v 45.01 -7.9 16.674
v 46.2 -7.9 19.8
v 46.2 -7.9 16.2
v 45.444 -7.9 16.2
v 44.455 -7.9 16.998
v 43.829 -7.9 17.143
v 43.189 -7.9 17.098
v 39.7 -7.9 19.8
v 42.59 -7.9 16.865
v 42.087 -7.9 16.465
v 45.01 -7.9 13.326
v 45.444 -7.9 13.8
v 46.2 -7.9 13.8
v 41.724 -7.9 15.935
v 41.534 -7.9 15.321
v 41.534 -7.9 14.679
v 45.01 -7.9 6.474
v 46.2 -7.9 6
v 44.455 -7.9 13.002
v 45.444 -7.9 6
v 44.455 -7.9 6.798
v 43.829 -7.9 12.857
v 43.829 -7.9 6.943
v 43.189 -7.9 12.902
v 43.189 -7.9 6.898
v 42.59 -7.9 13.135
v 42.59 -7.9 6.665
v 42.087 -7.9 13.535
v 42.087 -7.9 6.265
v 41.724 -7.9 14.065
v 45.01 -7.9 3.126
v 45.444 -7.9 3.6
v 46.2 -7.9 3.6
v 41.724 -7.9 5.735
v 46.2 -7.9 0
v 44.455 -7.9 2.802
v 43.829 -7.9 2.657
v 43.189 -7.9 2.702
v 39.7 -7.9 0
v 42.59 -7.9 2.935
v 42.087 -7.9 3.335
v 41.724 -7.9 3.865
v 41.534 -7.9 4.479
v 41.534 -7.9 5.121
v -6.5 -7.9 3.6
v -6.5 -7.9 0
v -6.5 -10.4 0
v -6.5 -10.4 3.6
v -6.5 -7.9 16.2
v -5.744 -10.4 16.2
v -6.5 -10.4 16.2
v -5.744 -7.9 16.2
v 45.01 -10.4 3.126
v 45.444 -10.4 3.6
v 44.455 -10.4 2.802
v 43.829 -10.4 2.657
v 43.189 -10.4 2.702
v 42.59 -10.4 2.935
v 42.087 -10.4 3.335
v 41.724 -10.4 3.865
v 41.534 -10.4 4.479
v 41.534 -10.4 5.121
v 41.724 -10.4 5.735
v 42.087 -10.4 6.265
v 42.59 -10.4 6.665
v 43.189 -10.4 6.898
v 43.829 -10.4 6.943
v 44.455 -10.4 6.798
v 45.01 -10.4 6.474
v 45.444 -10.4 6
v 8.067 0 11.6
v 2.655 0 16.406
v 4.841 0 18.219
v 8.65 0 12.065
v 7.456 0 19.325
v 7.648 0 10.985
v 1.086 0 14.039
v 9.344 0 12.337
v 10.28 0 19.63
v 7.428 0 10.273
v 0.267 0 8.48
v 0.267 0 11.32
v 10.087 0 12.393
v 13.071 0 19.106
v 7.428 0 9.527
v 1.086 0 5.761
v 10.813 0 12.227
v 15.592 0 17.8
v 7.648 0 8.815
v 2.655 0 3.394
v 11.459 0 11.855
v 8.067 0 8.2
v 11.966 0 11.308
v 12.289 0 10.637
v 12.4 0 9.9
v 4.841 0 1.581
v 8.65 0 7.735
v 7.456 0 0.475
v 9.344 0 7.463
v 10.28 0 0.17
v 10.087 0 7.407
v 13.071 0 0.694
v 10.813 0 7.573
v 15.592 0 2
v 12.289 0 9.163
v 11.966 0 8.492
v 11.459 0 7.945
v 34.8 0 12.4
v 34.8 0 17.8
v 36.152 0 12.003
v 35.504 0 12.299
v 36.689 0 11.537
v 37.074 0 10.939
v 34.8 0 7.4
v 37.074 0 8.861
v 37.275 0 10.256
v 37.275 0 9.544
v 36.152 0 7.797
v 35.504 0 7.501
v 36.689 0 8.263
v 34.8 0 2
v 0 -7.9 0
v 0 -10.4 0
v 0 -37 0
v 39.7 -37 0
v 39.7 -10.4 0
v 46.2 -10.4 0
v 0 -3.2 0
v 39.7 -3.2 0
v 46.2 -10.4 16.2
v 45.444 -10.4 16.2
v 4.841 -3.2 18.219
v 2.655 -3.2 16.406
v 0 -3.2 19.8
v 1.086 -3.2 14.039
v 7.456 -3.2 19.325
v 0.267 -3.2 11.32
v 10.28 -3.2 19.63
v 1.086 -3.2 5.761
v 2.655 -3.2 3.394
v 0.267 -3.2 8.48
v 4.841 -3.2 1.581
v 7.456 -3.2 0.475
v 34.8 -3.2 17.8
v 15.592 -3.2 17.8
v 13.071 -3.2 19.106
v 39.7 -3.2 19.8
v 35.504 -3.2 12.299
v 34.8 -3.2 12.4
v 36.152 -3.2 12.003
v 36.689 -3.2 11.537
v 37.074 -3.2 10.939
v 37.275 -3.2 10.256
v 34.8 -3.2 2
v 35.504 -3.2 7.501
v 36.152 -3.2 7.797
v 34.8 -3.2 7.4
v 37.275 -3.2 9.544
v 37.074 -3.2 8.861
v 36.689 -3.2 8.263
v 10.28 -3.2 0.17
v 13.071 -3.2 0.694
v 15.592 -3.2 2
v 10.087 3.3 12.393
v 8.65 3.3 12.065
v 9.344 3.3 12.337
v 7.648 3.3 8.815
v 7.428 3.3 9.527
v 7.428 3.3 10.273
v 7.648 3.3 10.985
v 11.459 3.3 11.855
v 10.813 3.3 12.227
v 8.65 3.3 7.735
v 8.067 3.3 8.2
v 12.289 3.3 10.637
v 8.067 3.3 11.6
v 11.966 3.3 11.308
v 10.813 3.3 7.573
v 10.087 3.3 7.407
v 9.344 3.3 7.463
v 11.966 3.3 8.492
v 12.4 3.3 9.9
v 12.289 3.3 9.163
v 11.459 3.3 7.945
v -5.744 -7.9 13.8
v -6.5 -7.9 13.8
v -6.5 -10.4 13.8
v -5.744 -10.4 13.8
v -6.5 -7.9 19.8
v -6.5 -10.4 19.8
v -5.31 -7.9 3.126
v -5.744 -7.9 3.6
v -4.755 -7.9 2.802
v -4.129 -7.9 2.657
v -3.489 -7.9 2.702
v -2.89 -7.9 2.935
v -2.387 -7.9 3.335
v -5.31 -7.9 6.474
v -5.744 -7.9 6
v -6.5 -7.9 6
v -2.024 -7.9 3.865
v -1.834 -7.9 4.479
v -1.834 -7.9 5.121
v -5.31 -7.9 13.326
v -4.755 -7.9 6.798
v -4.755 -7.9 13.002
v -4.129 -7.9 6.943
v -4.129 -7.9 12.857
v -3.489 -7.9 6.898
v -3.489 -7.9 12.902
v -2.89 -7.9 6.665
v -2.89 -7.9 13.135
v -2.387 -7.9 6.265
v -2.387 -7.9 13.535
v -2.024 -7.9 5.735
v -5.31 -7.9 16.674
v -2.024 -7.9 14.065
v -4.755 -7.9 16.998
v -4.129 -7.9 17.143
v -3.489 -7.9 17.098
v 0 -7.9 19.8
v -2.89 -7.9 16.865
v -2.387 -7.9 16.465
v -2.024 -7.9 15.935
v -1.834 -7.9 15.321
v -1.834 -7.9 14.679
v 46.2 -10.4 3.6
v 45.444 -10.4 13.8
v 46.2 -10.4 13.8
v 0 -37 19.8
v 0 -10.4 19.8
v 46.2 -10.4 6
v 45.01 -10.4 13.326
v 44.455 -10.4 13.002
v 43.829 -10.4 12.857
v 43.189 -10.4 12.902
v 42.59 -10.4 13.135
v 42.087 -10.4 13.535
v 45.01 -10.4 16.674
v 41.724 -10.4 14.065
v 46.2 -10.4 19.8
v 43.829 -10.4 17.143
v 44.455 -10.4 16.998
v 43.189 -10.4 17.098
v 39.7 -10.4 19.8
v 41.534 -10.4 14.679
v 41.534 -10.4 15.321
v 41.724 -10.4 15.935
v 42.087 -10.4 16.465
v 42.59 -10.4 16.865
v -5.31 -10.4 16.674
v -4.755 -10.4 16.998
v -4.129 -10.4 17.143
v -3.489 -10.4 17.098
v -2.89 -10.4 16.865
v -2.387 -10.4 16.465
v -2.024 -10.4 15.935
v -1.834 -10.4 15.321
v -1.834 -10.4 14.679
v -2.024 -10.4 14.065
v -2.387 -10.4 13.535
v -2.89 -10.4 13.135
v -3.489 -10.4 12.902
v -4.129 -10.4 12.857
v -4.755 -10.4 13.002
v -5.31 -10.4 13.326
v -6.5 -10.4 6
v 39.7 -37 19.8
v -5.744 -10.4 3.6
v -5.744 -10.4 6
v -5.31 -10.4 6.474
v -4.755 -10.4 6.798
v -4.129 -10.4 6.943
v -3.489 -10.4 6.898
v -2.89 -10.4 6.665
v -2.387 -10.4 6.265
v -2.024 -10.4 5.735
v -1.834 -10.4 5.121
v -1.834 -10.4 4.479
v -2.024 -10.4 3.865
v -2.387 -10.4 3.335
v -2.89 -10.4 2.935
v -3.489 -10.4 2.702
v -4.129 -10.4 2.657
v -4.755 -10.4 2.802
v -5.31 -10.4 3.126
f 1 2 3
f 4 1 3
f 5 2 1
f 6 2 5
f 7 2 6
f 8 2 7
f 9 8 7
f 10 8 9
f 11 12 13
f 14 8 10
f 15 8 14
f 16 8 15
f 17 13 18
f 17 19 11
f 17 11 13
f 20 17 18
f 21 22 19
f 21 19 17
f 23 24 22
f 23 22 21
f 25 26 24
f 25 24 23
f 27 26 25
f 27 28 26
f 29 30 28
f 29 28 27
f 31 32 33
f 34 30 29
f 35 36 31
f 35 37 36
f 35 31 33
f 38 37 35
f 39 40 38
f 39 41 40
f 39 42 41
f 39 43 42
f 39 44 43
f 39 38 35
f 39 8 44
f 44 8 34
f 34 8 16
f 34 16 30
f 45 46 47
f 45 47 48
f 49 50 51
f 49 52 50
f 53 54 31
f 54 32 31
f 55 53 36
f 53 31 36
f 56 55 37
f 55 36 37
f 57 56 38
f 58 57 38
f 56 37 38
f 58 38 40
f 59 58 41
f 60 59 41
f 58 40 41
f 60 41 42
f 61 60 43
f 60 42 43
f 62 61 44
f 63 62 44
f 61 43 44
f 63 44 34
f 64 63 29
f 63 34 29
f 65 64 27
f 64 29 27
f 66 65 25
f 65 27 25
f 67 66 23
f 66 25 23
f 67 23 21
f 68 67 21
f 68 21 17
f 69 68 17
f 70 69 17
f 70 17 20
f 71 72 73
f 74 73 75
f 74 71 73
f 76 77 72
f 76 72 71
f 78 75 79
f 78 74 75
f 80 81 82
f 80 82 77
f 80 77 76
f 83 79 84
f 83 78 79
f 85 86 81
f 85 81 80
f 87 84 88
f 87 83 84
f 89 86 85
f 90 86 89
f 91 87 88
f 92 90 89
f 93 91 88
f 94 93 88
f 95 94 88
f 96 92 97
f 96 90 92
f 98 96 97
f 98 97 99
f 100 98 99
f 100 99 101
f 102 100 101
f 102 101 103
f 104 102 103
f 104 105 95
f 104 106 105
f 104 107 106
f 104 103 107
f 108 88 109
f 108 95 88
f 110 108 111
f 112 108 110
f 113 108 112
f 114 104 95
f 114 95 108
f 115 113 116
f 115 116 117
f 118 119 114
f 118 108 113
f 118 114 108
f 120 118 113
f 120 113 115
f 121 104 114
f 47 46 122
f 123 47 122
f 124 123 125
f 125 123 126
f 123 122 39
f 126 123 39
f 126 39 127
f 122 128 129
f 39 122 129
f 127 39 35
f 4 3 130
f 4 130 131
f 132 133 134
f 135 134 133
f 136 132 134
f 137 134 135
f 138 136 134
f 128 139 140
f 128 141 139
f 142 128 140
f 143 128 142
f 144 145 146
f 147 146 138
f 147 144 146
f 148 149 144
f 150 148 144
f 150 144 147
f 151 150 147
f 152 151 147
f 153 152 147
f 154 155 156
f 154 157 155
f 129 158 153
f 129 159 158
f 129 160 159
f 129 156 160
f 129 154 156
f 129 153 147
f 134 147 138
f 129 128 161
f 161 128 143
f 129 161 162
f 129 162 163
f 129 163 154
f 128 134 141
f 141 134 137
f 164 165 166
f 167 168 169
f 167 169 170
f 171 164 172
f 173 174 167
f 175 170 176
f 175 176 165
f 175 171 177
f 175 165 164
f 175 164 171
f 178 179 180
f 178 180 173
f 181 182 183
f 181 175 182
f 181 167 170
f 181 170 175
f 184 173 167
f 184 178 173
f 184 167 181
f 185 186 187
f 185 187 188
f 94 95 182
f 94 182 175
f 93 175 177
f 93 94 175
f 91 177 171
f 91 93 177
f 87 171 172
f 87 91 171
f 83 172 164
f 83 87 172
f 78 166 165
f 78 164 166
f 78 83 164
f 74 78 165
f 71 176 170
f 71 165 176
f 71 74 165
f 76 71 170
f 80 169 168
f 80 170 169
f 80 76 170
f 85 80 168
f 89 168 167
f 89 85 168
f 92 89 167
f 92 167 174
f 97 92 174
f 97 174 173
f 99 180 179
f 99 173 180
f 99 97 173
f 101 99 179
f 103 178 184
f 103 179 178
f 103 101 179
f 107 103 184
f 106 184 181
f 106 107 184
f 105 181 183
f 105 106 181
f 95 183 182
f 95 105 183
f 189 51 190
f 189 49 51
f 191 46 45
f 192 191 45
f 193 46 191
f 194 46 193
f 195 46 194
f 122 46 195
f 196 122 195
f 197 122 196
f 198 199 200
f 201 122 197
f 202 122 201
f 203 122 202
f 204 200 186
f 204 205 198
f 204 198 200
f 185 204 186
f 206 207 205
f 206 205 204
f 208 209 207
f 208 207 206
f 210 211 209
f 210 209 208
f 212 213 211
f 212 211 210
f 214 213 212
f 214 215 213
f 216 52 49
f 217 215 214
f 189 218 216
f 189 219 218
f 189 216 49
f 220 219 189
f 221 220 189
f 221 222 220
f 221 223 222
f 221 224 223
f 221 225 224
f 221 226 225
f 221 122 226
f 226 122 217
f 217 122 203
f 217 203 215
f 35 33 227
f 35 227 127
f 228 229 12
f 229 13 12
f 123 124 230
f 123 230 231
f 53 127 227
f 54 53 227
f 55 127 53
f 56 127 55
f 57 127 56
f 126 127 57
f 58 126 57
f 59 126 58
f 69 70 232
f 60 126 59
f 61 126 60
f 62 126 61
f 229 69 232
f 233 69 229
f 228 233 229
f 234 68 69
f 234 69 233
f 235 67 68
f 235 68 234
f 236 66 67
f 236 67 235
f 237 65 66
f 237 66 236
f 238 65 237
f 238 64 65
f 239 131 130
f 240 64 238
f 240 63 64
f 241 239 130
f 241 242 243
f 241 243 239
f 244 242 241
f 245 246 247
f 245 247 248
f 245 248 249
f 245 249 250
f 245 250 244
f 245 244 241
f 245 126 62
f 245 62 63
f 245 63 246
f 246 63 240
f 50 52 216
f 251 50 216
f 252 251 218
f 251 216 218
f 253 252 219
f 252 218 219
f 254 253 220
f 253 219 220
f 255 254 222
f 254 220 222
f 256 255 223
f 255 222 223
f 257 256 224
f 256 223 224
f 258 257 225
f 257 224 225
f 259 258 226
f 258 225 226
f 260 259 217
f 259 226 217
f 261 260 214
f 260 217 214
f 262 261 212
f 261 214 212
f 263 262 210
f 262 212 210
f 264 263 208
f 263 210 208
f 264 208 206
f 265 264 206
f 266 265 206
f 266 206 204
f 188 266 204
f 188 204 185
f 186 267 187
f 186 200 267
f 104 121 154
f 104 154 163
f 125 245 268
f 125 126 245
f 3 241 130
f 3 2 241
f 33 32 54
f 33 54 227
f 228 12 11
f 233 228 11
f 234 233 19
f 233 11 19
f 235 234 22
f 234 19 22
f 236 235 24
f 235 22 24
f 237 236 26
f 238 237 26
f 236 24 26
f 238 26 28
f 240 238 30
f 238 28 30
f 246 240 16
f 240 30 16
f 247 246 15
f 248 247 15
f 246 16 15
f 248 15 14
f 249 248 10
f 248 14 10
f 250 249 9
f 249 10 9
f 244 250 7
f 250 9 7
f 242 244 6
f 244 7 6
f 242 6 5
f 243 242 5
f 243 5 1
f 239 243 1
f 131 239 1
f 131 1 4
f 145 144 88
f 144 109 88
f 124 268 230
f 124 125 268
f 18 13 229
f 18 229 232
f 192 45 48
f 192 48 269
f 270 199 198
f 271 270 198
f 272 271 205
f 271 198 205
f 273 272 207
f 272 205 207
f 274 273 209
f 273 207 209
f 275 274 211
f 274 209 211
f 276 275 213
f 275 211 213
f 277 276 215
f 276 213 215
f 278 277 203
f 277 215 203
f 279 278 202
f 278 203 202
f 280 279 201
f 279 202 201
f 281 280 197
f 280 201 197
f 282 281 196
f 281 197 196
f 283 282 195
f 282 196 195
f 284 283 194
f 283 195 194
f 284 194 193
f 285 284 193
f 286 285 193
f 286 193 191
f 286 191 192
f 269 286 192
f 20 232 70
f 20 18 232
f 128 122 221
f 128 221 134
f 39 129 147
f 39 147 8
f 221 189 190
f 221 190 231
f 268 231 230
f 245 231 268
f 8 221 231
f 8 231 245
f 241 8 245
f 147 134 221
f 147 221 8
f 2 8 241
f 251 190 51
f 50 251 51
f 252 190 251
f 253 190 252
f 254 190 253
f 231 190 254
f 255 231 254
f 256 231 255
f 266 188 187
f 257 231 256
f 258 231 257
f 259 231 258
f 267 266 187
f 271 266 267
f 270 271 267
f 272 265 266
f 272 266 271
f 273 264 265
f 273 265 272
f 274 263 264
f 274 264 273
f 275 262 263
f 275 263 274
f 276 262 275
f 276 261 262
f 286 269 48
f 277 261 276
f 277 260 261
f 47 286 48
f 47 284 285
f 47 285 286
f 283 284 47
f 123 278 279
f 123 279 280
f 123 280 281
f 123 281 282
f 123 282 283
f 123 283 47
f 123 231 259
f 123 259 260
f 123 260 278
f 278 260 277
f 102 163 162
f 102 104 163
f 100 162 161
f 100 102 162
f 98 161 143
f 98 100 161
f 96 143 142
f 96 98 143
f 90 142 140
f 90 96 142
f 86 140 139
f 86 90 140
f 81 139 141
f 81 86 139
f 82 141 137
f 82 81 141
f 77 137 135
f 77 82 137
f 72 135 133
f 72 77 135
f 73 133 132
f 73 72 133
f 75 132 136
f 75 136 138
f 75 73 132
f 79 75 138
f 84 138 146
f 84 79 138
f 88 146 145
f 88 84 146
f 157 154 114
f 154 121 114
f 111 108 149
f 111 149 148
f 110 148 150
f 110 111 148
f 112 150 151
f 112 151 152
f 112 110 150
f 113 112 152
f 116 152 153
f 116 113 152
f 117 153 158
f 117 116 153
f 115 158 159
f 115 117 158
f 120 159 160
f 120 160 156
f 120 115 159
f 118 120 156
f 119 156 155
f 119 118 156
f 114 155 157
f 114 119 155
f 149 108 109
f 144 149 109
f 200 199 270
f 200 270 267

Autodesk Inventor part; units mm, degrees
ref_plane "YZ Plane" through (0, 0, 0) normal (1, 0, 0) x (0, 1, 0)
ref_plane "XZ Plane" through (0, 0, 0) normal (0, 1, 0) x (-1, 0, 0)
ref_plane "XY Plane" through (0, 0, 0) normal (0, 0, 1) x (1, 0, 0)
sketch "Sketch1" plane through (0, 0, 0) normal (0, 0, 1) x (1, 0, 0)
  line L0 (0, 0) -> (39.7, 0)
  line L1 (39.7, 0) -> (39.7, -37)
  line L2 (39.7, -37) -> (0, -37)
  line L3 (0, -37) -> (0, 0)
  dimension "d0" = 39.7
  dimension "d1" = 37
extrude "Extrusion1" add sketch "Sketch1" along normal blind 19.8
sketch "Sketch2" plane through (39.7, -37, 0) normal (1, 0, 0) x (0, 0, -1)
  line L0 (-19.8, 37) -> (-19.8, 0) projected
  line L1 (0, 37) -> (0, 0) projected
  line L2 (0, 37) -> (-19.8, 37) projected
  line L3 (-19.8, 29.1) -> (0, 29.1)
  line L4 (0, 29.1) -> (0, 26.6)
  line L5 (0, 26.6) -> (-19.8, 26.6)
  line L6 (-19.8, 26.6) -> (-19.8, 29.1)
  dimension "d4" = 2.5
  dimension "d5" = 10.4
extrude "Extrusion2" add sketch "Sketch2" along normal blind 6.5 contours L3 L1 L5 L0
sketch "Sketch3" plane through (39.7, -7.9, 19.8) normal (0, 1, 0) x (1, 0, 0)
  line L0 (6.5, 0) -> (6.5, 19.8) projected
  arc A0 (5.744, 16.2) -> (5.744, 13.8) centre (3.96, 15) ccw
  arc A1 (5.744, 6) -> (5.744, 3.6) centre (3.96, 4.8) ccw
  line L1 (6.5, 4.8) -> (6.5, 6)
  line L2 (6.5, 6) -> (5.744, 6)
  line L3 (6.5, 3.6) -> (5.744, 3.6)
  line L4 (6.5, 4.8) -> (6.5, 3.6)
  line L5 (6.5, 15) -> (6.5, 13.8)
  line L6 (6.5, 13.8) -> (5.744, 13.8)
  line L7 (5.744, 16.2) -> (6.5, 16.2)
  line L8 (6.5, 16.2) -> (6.5, 15)
  point P0 (-39.7, 19.8)
extrude "Extrusion3" cut sketch "Sketch3" against normal blind 6.5
sketch "Sketch4" plane through (0, -37, 0) normal (-1, 0, 0) x (0, 0, 1)
  line L0 (19.8, 0) -> (19.8, 37) projected
  line L1 (0, 37) -> (19.8, 37) projected
  line L2 (0, 0) -> (0, 37) projected
  line L3 (0, 29.1) -> (19.8, 29.1)
  line L4 (19.8, 29.1) -> (19.8, 26.6)
  line L5 (19.8, 26.6) -> (0, 26.6)
  line L6 (0, 26.6) -> (0, 29.1)
  dimension "d18" = 2.5
  dimension "d19" = 10.4
extrude "Extrusion4" add sketch "Sketch4" along normal blind 6.5 contours L5 L2 L3 L0
sketch "Sketch5" plane through (0, -7.9, 19.8) normal (0, 1, 0) x (1, 0, 0)
  line L0 (-6.5, 19.8) -> (-6.5, 0) projected
  arc A0 (-5.744, 3.6) -> (-5.744, 6) centre (-3.96, 4.8) ccw
  arc A1 (-5.744, 13.8) -> (-5.744, 16.2) centre (-3.96, 15) ccw
  line L1 (-6.5, 15) -> (-6.5, 16.2)
  line L2 (-6.5, 16.2) -> (-5.744, 16.2)
  line L3 (-5.744, 13.8) -> (-6.5, 13.8)
  line L4 (-6.5, 13.8) -> (-6.5, 15)
  line L5 (-6.5, 4.8) -> (-6.5, 6)
  line L6 (-6.5, 6) -> (-5.744, 6)
  line L7 (-5.744, 3.6) -> (-6.5, 3.6)
  line L8 (-6.5, 3.6) -> (-6.5, 4.8)
  dimension "d25" = 4.3
  dimension "d26" = 1.2
  dimension "d27" = 2.4
extrude "Extrusion5" cut sketch "Sketch5" against normal blind 6.5
sketch "Sketch6" plane through (0, 0, 0) normal (0, 1, 0) x (1, 0, 0)
  line L0 (0, 0) -> (39.7, 0) projected
  line L1 (0, 0) -> (0, -19.8) projected
  circle A0 centre (9.9, -9.9) radius 2.5
  dimension "d30" = 5
  dimension "d31" = 19.8
  dimension "d32" = 9.9
  dimension "d33" = 9.9
extrude "Extrusion6" add sketch "Sketch6" along normal blind 3.3
sketch "Sketch7" plane through (0, 0, 0) normal (0, 1, 0) x (1, 0, 0)
  circle A0 centre (9.9, -9.9) radius 2.5 projected
  line L0 (0, -19.8) -> (39.7, -19.8) projected
  line L1 (39.7, 0) -> (39.7, -19.8) projected
  line L2 (0, 0) -> (39.7, 0) projected
  line L3 (0, 0) -> (0, -19.8) projected
  arc A1 (15.5921, -2) -> (15.5921, -17.8) centre (9.9, -9.9) ccw
  line L4 (34.8, -2) -> (15.5921, -2)
  line L5 (34.8, -17.8) -> (15.5921, -17.8)
  arc A2 (34.8, -12.4) -> (34.8, -7.4) centre (34.8, -9.9) ccw
  line L6 (34.8, -2) -> (34.8, -7.4)
  line L7 (34.8, -12.4) -> (34.8, -17.8)
  dimension "d36" = 2
  dimension "d37" = 2
  dimension "d39" = 5
extrude "Extrusion7" cut sketch "Sketch7" against normal blind 3.2 contours L3 L2 L1 L0
properties part number "7955"
